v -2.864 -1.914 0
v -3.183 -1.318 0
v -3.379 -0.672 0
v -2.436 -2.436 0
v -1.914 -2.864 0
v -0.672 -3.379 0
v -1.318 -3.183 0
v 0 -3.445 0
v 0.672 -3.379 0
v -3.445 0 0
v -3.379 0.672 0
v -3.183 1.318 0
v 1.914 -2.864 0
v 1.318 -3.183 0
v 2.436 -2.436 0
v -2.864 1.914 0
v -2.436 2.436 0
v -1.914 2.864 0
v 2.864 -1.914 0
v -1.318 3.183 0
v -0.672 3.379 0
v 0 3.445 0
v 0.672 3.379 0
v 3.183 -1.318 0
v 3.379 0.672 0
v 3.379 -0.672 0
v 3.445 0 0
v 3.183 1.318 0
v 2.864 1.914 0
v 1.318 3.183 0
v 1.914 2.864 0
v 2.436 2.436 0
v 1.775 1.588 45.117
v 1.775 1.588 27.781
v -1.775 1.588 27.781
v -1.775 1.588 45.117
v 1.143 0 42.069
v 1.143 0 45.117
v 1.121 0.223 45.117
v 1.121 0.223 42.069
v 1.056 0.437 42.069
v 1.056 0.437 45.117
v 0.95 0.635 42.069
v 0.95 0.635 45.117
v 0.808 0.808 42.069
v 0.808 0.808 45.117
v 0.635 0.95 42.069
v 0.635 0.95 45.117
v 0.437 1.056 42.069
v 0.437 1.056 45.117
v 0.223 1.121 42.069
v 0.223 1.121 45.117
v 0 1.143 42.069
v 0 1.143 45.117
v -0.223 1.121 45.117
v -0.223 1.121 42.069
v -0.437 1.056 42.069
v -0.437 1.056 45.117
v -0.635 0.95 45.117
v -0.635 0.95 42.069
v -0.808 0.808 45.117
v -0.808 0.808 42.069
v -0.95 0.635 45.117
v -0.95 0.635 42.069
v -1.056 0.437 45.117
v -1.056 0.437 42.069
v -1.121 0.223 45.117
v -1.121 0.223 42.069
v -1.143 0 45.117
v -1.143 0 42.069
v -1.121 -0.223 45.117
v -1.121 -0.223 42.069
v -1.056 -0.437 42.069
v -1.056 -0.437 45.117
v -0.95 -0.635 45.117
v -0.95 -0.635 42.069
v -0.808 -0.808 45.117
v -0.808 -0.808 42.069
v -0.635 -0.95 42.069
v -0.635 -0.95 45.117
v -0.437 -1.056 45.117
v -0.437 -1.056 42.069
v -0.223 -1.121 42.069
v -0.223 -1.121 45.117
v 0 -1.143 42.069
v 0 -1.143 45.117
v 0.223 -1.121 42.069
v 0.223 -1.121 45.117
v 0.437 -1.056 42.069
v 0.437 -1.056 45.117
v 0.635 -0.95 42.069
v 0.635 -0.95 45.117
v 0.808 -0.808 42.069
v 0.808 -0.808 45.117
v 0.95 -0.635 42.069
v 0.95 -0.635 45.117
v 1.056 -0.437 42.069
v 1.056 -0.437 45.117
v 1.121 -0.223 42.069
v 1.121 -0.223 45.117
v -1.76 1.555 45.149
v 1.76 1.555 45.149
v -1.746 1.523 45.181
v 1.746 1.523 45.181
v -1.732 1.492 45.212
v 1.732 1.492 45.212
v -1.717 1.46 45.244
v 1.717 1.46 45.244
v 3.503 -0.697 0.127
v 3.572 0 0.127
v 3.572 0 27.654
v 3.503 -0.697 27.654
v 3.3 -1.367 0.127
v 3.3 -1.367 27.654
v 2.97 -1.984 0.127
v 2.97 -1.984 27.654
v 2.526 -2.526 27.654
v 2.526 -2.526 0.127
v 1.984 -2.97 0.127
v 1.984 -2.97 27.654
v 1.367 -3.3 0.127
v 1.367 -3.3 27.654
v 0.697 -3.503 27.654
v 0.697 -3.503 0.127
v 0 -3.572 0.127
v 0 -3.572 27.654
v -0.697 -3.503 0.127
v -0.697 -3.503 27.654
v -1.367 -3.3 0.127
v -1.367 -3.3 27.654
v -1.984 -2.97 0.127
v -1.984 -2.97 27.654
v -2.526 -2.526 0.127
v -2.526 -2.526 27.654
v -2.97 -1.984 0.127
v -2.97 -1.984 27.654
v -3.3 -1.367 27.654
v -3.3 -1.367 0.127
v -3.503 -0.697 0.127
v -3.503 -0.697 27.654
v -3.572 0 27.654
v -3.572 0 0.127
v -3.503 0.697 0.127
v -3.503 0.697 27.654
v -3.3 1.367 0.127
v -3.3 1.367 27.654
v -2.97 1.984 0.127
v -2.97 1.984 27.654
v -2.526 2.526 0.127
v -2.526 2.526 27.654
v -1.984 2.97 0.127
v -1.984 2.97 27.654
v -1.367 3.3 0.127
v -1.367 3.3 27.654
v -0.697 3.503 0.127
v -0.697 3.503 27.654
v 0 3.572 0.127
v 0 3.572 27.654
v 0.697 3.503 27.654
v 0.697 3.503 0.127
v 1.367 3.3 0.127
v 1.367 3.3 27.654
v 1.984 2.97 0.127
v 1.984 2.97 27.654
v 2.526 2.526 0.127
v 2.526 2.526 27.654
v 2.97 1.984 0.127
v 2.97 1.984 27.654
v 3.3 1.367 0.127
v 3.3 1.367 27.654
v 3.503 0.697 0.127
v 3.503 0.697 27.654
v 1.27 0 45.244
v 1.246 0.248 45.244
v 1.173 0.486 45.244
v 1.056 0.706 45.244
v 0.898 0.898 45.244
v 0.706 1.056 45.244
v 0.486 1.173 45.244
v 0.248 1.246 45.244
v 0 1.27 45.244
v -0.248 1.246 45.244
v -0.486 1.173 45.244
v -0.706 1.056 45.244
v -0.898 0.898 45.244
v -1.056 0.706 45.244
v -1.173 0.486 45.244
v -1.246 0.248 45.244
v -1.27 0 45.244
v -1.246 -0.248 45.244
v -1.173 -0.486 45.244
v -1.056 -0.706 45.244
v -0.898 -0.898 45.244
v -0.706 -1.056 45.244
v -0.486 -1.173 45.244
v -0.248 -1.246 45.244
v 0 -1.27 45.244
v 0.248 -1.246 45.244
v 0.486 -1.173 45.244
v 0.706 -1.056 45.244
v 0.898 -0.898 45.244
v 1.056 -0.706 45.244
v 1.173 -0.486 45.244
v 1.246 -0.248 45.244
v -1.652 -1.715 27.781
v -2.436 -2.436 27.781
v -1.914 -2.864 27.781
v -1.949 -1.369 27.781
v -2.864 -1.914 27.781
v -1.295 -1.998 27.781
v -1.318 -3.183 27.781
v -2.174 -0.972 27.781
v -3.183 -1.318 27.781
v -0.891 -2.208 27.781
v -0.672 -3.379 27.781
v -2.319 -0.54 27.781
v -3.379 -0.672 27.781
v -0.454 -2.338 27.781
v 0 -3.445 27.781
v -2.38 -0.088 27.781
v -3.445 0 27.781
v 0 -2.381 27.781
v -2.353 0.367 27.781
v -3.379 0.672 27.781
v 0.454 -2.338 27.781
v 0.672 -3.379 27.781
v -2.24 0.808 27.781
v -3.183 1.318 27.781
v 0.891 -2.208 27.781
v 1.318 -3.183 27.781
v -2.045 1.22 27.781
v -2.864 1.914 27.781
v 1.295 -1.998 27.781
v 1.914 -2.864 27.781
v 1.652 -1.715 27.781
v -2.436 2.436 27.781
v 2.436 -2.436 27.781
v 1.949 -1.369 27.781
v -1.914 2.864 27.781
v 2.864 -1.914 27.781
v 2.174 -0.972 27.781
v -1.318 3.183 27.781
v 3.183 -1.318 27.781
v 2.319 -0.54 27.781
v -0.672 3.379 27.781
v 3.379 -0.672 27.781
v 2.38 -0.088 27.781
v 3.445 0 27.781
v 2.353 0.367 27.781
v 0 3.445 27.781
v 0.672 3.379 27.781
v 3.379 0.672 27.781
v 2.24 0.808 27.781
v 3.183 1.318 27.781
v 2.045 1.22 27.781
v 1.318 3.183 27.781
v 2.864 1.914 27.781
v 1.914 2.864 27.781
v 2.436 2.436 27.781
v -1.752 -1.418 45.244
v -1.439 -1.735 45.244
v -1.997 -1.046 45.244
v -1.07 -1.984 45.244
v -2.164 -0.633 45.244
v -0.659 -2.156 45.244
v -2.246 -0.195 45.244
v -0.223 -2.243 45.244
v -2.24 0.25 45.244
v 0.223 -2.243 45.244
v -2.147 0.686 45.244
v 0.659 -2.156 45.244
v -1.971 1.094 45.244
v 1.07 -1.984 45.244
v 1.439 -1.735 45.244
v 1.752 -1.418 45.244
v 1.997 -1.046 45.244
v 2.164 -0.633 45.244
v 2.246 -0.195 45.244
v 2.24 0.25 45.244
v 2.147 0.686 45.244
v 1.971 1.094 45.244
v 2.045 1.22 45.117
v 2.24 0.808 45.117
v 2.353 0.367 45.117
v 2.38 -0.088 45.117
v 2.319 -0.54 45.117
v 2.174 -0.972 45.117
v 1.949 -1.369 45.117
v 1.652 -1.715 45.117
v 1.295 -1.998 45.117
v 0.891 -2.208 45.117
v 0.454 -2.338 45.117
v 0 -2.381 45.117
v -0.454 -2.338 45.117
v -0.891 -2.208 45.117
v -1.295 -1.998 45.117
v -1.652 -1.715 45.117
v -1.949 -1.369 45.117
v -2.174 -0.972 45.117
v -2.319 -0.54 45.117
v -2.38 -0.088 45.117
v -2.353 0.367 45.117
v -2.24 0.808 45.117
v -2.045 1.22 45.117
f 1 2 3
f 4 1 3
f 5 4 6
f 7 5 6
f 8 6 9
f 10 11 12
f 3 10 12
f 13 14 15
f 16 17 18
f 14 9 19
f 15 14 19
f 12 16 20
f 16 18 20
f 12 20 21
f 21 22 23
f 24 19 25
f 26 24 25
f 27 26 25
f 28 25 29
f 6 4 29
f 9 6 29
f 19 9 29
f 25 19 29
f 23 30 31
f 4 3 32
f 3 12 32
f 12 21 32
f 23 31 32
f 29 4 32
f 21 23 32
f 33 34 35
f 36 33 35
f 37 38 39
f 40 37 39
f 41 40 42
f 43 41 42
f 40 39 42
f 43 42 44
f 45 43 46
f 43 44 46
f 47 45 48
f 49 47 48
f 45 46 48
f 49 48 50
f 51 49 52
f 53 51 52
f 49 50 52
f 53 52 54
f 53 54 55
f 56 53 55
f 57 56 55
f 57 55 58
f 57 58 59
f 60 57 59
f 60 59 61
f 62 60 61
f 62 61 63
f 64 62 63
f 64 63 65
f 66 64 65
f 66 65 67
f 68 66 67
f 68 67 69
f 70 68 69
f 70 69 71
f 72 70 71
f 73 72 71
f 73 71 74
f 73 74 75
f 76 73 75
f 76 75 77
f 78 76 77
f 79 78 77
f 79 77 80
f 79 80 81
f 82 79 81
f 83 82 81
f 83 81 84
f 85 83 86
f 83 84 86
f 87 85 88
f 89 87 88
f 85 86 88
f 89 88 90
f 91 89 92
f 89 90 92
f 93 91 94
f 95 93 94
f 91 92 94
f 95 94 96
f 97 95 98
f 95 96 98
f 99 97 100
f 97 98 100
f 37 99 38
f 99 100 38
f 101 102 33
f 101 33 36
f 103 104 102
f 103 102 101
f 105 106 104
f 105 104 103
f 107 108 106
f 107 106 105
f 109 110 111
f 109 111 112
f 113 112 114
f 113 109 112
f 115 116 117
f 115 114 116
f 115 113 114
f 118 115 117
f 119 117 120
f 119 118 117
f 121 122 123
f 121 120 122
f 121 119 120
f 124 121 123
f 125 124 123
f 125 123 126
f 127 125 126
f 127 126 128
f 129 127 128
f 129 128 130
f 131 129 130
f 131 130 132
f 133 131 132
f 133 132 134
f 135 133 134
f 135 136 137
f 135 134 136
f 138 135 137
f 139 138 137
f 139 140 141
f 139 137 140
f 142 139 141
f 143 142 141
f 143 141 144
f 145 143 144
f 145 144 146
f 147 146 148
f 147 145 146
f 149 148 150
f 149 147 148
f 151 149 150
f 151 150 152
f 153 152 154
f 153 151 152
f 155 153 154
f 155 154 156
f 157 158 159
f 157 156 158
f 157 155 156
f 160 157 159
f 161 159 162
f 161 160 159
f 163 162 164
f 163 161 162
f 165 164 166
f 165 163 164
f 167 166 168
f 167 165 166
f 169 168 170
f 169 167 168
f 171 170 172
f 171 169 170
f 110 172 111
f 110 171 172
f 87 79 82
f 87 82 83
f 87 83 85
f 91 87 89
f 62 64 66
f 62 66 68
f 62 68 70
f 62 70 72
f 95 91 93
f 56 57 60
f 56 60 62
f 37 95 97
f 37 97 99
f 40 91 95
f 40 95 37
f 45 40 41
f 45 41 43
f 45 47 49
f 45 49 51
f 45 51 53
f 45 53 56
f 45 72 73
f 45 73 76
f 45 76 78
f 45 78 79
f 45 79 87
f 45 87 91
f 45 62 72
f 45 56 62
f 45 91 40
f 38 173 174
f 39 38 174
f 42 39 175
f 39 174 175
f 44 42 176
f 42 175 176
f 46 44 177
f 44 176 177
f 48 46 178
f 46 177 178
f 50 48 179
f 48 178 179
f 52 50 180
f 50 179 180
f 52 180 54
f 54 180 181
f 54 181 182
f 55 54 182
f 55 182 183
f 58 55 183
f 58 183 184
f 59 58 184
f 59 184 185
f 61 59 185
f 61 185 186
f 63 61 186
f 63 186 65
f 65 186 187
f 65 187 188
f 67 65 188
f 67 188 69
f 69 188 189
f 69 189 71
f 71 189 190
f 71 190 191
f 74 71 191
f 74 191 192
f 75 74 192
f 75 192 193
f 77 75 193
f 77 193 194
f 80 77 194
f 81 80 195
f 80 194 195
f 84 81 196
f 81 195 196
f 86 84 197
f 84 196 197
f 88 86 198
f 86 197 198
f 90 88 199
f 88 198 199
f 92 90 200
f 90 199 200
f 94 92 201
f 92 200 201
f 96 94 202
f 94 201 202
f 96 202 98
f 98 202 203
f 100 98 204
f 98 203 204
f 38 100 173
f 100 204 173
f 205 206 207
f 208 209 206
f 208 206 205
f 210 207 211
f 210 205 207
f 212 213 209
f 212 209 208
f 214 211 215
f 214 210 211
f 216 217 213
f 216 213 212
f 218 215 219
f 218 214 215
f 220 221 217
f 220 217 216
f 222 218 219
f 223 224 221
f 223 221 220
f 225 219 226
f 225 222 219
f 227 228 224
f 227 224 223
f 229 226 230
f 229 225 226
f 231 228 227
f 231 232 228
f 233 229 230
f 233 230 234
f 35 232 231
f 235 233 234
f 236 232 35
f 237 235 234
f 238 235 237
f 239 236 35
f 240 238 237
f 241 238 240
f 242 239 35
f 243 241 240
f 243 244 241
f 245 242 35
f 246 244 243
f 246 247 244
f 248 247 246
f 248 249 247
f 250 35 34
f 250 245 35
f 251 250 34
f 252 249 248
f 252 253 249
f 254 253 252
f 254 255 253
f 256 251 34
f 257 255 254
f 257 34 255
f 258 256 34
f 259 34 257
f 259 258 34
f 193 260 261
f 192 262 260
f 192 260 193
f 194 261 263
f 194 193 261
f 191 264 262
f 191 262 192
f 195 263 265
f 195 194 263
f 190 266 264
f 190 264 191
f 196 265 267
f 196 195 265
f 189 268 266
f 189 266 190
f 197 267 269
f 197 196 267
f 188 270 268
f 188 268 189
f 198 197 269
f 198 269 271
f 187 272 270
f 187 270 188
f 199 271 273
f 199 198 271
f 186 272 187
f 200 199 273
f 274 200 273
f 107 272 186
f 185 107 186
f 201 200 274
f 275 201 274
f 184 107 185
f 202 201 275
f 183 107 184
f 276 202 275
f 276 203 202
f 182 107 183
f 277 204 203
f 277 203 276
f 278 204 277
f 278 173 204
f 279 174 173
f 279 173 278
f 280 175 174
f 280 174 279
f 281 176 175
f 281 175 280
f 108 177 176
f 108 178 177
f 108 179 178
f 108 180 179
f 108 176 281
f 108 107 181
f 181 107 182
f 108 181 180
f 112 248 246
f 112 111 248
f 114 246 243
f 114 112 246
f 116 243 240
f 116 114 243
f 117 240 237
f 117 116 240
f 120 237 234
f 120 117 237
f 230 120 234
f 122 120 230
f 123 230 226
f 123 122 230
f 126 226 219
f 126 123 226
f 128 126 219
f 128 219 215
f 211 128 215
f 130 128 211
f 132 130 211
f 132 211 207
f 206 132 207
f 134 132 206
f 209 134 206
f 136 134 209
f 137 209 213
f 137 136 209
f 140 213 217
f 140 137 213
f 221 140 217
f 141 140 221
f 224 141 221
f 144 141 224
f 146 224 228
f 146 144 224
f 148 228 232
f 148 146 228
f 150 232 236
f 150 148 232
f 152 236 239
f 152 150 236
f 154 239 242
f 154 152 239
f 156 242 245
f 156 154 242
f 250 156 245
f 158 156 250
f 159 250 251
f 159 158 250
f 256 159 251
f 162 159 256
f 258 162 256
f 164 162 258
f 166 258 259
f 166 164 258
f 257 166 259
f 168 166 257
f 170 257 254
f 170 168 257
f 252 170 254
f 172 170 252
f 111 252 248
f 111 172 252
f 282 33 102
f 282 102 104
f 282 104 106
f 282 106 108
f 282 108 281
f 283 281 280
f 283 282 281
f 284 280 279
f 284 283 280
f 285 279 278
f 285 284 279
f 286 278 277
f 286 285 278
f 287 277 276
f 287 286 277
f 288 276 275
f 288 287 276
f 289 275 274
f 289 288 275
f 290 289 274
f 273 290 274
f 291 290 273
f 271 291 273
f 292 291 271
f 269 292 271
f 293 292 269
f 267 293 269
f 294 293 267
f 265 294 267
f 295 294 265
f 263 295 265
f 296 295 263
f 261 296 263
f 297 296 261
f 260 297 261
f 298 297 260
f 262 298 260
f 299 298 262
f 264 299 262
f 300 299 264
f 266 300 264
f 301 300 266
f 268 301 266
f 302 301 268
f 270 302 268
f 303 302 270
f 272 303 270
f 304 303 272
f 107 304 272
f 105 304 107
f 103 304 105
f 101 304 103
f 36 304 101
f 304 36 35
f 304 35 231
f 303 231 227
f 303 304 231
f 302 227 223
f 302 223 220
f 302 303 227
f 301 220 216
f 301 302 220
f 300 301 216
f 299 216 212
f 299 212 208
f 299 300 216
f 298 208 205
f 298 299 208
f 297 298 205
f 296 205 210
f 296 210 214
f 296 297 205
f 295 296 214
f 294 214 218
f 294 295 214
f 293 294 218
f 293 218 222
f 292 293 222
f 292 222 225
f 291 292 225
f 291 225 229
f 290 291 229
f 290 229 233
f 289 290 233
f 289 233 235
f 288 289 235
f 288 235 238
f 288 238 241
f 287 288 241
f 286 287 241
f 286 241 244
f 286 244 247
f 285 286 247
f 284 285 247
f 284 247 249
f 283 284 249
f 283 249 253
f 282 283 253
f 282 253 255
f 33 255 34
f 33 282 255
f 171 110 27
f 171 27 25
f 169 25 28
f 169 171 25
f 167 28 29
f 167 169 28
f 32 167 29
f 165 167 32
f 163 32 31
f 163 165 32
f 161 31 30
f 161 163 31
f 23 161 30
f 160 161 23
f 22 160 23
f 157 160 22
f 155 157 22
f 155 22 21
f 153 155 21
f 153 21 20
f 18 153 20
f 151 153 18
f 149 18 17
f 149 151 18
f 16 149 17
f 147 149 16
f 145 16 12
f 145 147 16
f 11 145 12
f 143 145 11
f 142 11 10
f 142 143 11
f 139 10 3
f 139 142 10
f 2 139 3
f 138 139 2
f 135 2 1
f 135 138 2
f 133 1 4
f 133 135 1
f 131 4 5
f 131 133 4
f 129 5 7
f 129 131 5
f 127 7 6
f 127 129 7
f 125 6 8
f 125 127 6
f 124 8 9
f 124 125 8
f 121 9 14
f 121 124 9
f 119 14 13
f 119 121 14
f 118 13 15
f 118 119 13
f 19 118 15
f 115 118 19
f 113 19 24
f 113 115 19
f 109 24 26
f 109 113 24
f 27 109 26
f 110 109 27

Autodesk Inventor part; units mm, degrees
ref_plane "YZ Plane" through (0, 0, 0) normal (1, 0, 0) x (0, 1, 0)
ref_plane "XZ Plane" through (0, 0, 0) normal (0, 1, 0) x (-1, 0, 0)
ref_plane "XY Plane" through (0, 0, 0) normal (0, 0, 1) x (1, 0, 0)
sketch "Sketch1" plane through (0, 0, 0) normal (0, 0, 1) x (1, 0, 0)
  circle A0 centre (0, 0) radius 3.5719
  dimension "d10" = 7.1437
extrude "Extrusion1" add sketch "Sketch1" along normal blind 45.2438
sketch "Sketch2" plane through (0, 0, 45.2438) normal (0, 0, 1) x (1, 0, 0)
  arc A0 (-1.7749, 1.5875) -> (1.7749, 1.5875) centre (0, 0) ccw
  line L0 (1.7749, 1.5875) -> (-1.7749, 1.5875)
  circle A1 centre (0, 0) radius 3.5719 projected
  dimension "d2" = 4.7625
extrude "Extrusion2" cut sketch "Sketch2" against normal blind 17.4625
sketch "Sketch3" plane through (0, 0, 45.2438) normal (0, 0, 1) x (1, 0, 0)
  circle A0 centre (0, 0) radius 1.143
  dimension "d5" = 2.286
extrude "Extrusion3" cut sketch "Sketch3" against normal blind 3.175
chamfer "Chamfer1" distance 0.127 angle 45 5 edges at (0, -2.3813, 45.2438) (0, 1.5875, 45.2438) (-1.143, 0, 45.2438) (-3.5719, 0, 27.7813) (-3.5719, 0, 0)
properties part number "shaft" material "Brass, Soft Yellow"
